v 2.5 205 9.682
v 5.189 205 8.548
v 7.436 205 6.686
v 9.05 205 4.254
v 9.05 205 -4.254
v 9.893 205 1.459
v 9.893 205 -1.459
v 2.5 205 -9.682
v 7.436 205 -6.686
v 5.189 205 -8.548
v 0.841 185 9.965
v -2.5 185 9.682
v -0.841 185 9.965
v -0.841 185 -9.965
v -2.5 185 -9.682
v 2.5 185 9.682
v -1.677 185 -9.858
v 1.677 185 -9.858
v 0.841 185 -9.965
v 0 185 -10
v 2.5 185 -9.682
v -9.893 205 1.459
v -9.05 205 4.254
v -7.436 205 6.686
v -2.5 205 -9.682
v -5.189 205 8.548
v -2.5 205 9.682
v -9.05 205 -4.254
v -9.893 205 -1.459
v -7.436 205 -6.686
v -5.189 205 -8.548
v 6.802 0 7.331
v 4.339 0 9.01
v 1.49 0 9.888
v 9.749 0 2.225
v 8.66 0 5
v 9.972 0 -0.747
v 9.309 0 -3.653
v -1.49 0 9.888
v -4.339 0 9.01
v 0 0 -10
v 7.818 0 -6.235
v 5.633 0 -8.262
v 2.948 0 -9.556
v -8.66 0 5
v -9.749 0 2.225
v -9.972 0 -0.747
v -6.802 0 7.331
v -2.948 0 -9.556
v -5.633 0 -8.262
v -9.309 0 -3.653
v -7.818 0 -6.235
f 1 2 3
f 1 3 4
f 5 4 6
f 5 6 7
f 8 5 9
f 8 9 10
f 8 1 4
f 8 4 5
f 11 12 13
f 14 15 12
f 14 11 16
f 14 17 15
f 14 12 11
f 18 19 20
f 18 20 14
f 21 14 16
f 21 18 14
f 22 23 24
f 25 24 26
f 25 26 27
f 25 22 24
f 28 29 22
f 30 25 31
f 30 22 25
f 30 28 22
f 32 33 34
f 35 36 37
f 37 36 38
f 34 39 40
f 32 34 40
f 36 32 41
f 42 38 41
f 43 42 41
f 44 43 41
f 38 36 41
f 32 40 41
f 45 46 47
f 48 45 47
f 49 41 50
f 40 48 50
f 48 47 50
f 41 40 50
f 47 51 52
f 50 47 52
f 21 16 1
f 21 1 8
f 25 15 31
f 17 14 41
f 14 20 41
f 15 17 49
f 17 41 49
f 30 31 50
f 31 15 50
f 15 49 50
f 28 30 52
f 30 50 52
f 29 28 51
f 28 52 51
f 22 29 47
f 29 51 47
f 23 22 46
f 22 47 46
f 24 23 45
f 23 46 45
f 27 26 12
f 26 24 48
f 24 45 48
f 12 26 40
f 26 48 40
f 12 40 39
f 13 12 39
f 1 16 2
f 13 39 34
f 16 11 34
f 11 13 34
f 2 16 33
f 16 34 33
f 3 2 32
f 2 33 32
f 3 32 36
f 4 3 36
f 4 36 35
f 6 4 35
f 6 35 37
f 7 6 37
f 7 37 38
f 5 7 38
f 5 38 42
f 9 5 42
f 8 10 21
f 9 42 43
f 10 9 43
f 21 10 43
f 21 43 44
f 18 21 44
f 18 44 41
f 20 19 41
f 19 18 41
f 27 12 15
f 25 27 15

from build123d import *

# Parameters (mm, degrees)
SKETCH1_R           = 10
BOSS_EXTRUDE1_DEPTH = 205
SKETCH2_W           = 5
SKETCH2_H           = 23.07
CUT_EXTRUDE1_DEPTH  = 20


with BuildPart() as part:
    # Sketch1 → Boss-Extrude1 (new body)
    with BuildSketch(Plane(origin=(0, 0, 0), x_dir=(1, 0, 0), z_dir=(0, 1, 0))):
        with Locations(Location((0, 0, 0), (0, 0, 90))):
            Circle(SKETCH1_R)
    extrude(amount=BOSS_EXTRUDE1_DEPTH)

    # Sketch2 → Cut-Extrude1 (cut)
    with BuildSketch(Plane(origin=(0, 205, 0), x_dir=(1, 0, 0), z_dir=(0, 1, 0))):
        Rectangle(SKETCH2_W, SKETCH2_H)
    extrude(amount=-CUT_EXTRUDE1_DEPTH, mode=Mode.SUBTRACT)


solid = part.part
